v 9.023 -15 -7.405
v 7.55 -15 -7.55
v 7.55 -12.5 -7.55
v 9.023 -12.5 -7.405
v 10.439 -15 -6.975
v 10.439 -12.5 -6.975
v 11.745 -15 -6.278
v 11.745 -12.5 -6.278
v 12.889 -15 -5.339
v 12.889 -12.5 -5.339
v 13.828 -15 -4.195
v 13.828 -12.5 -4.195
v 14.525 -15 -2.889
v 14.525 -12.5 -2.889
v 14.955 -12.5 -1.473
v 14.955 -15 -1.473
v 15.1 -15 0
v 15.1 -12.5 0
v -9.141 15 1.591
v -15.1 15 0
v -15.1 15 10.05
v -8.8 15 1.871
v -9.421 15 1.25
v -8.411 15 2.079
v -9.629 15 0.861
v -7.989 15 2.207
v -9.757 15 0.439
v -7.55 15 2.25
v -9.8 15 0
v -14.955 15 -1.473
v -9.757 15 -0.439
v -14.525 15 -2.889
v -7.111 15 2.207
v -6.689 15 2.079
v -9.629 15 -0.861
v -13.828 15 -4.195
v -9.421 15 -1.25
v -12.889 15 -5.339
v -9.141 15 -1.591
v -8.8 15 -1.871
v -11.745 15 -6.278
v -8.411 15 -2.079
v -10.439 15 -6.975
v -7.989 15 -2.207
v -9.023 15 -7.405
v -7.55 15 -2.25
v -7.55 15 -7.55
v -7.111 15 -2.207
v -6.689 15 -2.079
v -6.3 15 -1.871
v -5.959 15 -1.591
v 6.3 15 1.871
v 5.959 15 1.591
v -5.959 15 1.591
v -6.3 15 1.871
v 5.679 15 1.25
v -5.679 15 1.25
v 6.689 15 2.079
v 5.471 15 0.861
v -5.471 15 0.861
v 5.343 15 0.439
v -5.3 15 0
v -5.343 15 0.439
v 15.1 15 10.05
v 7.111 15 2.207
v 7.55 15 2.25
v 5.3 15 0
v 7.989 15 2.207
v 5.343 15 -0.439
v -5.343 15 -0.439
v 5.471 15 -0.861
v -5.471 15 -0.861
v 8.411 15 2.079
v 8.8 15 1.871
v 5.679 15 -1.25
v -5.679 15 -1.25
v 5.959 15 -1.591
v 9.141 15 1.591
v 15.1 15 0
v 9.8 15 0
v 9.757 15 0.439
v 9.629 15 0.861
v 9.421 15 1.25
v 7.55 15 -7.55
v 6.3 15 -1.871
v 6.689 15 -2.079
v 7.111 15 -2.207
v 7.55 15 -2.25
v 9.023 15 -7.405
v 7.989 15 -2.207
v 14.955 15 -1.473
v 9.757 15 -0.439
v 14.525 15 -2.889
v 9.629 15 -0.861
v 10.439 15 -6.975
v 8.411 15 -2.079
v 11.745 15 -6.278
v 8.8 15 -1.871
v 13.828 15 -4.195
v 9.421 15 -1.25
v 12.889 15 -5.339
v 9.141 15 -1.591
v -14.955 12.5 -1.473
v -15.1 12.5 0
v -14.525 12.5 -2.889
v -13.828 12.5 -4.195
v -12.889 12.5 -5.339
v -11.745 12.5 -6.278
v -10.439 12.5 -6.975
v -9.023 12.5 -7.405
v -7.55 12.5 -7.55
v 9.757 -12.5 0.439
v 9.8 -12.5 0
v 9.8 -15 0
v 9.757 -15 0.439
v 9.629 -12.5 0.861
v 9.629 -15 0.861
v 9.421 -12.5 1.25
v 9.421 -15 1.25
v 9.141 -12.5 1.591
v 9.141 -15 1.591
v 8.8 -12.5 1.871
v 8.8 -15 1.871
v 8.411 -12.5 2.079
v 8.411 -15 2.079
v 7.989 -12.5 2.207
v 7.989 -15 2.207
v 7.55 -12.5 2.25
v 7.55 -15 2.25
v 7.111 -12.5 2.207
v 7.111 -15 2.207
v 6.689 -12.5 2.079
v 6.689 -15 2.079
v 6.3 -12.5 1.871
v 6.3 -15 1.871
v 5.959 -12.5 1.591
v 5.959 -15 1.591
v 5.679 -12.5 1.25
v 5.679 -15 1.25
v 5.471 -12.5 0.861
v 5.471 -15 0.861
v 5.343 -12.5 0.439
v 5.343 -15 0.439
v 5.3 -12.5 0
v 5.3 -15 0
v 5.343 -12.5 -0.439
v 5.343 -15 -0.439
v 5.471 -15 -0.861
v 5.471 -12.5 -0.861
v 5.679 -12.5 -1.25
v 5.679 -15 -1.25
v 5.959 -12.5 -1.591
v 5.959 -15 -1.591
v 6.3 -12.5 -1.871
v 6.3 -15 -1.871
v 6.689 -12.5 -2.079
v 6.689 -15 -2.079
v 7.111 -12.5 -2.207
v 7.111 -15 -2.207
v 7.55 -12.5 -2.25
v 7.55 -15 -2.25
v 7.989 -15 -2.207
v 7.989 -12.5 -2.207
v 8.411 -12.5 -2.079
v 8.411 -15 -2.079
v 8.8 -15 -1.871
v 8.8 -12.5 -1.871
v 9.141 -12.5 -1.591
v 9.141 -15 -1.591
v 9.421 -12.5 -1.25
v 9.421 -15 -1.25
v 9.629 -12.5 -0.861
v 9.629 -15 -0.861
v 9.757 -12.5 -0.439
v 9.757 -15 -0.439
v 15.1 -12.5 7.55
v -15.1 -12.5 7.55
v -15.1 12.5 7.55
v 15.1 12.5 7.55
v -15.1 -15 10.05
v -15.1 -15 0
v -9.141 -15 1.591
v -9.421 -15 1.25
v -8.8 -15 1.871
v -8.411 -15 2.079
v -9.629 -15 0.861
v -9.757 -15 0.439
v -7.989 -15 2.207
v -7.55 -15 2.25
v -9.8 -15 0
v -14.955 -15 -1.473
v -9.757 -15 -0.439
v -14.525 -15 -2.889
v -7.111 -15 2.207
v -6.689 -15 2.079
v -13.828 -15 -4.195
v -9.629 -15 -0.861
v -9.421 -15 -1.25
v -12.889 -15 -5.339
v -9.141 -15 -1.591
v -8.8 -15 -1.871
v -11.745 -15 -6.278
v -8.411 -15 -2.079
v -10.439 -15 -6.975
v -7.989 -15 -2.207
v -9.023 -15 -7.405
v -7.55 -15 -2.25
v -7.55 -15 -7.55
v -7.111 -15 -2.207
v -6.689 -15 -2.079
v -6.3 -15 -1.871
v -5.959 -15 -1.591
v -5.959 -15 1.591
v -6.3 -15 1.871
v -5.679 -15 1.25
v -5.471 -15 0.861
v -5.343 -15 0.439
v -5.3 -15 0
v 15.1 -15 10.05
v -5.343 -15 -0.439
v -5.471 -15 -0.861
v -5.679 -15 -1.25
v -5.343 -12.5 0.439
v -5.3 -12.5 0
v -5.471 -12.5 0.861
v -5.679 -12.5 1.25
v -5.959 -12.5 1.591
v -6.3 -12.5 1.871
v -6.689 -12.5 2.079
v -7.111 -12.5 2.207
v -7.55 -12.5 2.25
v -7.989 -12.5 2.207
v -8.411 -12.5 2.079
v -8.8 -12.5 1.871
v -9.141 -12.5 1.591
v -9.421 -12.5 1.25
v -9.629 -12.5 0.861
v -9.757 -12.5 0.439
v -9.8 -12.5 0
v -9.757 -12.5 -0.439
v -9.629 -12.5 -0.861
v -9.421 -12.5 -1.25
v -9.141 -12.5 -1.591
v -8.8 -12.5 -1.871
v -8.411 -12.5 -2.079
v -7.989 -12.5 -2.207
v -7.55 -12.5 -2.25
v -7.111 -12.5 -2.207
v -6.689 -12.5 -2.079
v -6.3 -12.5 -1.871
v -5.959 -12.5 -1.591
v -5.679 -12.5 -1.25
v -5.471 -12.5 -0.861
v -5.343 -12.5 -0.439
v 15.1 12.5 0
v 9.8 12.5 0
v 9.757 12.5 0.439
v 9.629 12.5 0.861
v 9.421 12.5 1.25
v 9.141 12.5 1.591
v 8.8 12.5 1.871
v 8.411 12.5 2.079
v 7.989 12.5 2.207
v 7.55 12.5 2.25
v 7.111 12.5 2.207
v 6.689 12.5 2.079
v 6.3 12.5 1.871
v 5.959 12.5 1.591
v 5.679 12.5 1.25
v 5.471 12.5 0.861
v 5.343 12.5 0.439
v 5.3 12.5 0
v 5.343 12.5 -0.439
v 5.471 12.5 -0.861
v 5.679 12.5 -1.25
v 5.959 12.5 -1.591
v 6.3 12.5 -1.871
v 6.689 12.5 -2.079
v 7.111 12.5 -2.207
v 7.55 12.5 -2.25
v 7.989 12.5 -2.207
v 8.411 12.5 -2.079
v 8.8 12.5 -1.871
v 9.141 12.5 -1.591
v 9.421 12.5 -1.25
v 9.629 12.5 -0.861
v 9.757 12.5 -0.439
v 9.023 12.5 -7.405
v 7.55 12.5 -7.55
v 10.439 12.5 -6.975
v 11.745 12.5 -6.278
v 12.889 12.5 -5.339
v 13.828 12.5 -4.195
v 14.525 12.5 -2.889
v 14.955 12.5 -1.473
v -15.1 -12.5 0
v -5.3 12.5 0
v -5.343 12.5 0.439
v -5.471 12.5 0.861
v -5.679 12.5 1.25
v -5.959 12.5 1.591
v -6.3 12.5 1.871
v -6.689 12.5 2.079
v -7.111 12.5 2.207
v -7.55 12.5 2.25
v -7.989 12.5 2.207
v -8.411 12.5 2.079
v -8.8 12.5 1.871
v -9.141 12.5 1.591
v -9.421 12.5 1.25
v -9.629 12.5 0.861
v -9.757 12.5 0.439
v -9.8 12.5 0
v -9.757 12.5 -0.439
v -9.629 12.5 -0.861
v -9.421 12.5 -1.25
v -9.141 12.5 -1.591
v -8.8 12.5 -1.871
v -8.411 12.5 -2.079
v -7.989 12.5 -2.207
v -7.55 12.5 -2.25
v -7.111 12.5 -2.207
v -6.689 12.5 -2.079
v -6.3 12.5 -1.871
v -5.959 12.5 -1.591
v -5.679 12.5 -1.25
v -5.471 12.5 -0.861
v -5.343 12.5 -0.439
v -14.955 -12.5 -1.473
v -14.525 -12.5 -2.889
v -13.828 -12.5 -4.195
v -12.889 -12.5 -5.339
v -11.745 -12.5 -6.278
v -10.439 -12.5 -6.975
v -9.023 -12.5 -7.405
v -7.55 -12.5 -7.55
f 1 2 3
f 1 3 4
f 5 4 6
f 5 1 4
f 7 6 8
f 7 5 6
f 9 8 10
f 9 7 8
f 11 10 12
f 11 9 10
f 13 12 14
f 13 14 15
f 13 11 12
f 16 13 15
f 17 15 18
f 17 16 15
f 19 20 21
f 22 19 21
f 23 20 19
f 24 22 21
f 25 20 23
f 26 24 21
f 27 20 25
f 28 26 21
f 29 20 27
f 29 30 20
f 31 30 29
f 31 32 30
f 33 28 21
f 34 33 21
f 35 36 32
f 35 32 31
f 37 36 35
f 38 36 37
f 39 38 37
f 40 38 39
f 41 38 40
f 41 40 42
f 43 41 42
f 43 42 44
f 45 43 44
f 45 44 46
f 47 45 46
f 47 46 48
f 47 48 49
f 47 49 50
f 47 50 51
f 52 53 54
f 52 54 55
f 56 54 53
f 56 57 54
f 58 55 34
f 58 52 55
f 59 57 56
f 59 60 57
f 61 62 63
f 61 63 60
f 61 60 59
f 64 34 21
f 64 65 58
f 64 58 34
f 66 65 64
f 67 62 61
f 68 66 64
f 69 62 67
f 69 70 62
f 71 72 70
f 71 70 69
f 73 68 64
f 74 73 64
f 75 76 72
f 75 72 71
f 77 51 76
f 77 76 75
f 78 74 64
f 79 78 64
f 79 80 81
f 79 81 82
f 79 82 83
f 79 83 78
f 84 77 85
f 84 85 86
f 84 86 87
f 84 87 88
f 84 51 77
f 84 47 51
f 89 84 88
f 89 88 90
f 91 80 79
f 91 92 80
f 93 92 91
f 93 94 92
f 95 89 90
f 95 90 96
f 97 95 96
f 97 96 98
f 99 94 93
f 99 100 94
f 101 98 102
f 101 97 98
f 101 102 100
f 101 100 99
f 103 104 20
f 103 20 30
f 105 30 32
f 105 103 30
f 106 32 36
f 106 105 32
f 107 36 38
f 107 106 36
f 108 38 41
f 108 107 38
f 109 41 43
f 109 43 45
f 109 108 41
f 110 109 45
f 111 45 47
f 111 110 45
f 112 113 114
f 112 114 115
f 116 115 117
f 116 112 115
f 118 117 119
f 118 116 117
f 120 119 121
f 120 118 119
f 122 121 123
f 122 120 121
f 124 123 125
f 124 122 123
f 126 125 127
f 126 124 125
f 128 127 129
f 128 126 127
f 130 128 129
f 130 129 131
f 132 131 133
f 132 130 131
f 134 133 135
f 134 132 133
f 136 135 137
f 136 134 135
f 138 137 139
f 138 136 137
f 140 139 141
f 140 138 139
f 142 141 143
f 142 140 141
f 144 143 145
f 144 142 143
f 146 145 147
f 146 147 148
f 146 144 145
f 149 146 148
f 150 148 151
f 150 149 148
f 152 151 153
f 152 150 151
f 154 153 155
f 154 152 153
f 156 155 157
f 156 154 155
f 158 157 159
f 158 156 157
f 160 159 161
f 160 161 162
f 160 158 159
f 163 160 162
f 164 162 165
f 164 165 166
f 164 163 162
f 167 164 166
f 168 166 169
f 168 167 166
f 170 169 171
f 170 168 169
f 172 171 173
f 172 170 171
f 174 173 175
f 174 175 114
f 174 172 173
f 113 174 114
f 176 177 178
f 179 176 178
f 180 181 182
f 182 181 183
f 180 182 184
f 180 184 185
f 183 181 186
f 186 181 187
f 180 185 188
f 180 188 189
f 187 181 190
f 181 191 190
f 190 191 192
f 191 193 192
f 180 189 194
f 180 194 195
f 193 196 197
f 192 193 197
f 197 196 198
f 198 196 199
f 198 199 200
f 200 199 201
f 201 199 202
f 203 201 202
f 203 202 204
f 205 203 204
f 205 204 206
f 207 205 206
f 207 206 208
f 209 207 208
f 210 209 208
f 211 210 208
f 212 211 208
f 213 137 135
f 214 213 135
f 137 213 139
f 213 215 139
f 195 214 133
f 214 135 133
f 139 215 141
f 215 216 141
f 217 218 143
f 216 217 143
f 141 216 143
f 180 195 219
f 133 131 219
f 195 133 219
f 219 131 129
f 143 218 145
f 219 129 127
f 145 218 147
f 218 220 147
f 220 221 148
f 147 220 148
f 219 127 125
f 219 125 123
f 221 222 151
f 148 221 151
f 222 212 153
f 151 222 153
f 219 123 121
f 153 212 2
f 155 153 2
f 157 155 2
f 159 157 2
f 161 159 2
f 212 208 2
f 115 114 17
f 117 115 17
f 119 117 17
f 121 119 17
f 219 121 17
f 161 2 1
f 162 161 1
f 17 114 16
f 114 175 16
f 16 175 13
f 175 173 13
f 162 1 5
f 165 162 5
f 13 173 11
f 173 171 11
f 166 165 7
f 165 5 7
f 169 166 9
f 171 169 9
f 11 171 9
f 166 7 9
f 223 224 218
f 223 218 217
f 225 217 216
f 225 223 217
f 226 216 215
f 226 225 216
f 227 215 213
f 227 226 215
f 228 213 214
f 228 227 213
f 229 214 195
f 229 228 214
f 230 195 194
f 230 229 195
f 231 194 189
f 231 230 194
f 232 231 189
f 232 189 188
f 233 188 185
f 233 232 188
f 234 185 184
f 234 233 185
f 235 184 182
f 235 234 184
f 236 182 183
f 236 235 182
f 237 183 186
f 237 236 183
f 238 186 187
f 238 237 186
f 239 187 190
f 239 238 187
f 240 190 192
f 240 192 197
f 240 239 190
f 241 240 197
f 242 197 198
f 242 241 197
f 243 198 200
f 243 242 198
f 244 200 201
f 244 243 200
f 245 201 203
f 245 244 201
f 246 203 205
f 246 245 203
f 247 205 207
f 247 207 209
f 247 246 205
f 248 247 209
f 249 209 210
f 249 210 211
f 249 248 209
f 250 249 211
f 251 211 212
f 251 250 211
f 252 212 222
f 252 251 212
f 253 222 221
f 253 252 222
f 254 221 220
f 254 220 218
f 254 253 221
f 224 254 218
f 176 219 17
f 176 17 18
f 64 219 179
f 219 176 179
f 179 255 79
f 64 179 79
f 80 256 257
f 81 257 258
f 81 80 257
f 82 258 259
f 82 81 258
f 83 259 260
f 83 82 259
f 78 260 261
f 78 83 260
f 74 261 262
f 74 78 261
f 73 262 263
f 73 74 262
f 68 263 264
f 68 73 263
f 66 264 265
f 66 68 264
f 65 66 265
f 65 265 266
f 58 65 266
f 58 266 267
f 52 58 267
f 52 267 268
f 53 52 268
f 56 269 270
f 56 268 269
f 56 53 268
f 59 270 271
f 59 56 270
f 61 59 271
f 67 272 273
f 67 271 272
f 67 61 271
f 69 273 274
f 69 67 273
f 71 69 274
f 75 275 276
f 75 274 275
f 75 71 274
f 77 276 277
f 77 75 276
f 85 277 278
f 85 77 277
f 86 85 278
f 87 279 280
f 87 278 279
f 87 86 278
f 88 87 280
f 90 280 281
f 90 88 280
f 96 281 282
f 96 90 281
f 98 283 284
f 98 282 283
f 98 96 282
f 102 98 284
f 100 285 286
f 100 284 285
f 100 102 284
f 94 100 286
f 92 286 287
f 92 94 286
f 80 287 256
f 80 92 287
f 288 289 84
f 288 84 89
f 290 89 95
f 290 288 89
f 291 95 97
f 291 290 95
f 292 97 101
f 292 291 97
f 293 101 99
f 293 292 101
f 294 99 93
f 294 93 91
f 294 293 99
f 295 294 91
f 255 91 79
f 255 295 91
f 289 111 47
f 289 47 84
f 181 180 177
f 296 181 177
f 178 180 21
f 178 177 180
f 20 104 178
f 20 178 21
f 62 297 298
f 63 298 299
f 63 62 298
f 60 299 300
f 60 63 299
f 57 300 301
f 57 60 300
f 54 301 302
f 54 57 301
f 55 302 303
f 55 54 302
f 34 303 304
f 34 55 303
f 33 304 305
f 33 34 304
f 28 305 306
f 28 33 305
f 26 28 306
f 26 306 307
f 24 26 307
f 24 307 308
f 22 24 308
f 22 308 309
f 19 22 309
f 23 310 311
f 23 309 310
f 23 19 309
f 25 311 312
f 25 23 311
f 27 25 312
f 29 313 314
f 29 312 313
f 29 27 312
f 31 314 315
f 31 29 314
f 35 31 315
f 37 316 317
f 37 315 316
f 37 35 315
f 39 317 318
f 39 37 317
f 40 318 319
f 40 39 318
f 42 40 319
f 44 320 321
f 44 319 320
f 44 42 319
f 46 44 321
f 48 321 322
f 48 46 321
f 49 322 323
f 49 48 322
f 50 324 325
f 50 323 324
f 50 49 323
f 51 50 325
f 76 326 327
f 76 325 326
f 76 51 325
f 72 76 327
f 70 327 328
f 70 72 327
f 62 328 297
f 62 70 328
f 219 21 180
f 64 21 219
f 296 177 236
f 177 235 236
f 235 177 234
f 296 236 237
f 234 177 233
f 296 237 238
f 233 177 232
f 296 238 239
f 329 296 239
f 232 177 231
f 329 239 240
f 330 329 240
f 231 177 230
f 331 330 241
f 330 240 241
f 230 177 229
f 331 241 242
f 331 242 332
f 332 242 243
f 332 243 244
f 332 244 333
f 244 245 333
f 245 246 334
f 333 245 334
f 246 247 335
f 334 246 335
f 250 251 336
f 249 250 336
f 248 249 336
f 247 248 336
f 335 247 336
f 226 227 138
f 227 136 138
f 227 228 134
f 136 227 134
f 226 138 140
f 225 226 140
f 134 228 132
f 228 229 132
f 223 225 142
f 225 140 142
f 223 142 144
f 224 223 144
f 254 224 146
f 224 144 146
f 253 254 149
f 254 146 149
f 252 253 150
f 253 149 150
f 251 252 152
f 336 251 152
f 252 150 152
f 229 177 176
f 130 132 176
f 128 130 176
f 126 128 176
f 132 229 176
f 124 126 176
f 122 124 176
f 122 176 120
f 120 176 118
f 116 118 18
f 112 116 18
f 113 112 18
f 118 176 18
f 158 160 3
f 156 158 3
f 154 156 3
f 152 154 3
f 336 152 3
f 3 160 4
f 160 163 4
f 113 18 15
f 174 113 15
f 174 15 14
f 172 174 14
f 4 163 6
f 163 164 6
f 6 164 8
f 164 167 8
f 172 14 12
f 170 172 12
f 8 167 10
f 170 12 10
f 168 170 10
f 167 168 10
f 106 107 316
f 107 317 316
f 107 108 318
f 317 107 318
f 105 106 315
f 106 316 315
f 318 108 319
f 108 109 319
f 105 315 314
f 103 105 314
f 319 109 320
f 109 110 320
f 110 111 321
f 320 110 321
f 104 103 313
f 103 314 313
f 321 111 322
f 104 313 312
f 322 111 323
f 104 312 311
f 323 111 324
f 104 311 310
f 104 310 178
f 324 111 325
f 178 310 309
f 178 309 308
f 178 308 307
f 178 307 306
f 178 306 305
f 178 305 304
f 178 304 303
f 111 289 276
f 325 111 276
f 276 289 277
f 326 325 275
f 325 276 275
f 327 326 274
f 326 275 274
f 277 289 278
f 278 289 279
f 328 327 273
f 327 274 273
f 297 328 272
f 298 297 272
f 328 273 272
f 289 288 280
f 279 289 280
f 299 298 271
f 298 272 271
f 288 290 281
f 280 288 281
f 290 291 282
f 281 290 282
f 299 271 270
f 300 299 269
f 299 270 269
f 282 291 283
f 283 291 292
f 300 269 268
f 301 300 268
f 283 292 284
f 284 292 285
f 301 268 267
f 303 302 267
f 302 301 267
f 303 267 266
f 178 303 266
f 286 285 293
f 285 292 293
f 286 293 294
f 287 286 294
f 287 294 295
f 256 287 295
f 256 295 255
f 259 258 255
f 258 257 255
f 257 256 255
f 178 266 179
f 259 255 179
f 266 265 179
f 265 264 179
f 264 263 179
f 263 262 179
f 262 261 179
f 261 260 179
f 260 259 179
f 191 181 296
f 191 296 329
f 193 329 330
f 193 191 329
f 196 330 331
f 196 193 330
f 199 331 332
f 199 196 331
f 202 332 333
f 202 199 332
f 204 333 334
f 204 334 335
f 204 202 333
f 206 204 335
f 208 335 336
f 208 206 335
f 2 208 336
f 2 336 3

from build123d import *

# Parameters (mm, degrees)
F0_R     = 2.25
F1_DEPTH = 15
F2_W     = 30.2
F2_H     = 30
F3_DEPTH = 2.5
F4_W     = 25
F4_H     = 7.55
F5_DEPTH = 30.201


with BuildPart() as f1:
    # F0 (on Front) → F1 (new body, symmetric)
    with BuildSketch(Plane.XZ):
        with BuildLine():
            ThreePointArc((-7.55, -7.55), (-2.211344, -5.338656), (0, 0))
            ThreePointArc((0, 0), (-2.211344, 5.338656), (-7.55, 7.55))
            ThreePointArc((-7.55, 7.55), (-12.888656, 5.338656), (-15.1, 0))
            ThreePointArc((-15.1, 0), (-12.888656, -5.338656), (-7.55, -7.55))
        make_face()
        with Locations((-7.55, 0)):
            Circle(F0_R, mode=Mode.SUBTRACT)
        with BuildLine():
            ThreePointArc((-15.1, 0), (-12.888656, 5.338656), (-7.55, 7.55))
            Line((-7.55, 7.55), (-15.1, 7.55))
            Line((-15.1, 7.55), (-15.1, 0))
        make_face()
        with BuildLine():
            ThreePointArc((-7.55, 7.55), (-2.211344, 5.338656), (0, 0))
            ThreePointArc((0, 0), (2.211344, 5.338656), (7.55, 7.55))
            Line((7.55, 7.55), (-7.55, 7.55))
        make_face()
        with BuildLine():
            Line((15.1, 7.55), (7.55, 7.55))
            ThreePointArc((7.55, 7.55), (12.888656, 5.338656), (15.1, 0))
            Line((15.1, 0), (15.1, 7.55))
        make_face()
        with BuildLine():
            ThreePointArc((7.55, -7.55), (2.211344, -5.338656), (0, 0))
            ThreePointArc((0, 0), (-2.211344, -5.338656), (-7.55, -7.55))
            Line((-7.55, -7.55), (7.55, -7.55))
        make_face()
        with BuildLine():
            ThreePointArc((7.55, 7.55), (2.211344, 5.338656), (0, 0))
            ThreePointArc((0, 0), (2.211344, -5.338656), (7.55, -7.55))
            ThreePointArc((7.55, -7.55), (12.888656, -5.338656), (15.1, 0))
            ThreePointArc((15.1, 0), (12.888656, 5.338656), (7.55, 7.55))
        make_face()
        with Locations((7.55, 0)):
            Circle(F0_R, mode=Mode.SUBTRACT)
    extrude(amount=F1_DEPTH, both=True)

    # F2 (on face) → F3 (join)
    with BuildSketch(Plane.XY.offset(7.55)):
        Rectangle(F2_W, F2_H)
    extrude(amount=F3_DEPTH)

    # F4 (on face) → F5 (cut, through all)
    with BuildSketch(Plane.YZ.offset(15.1)):
        with Locations((0, 3.775)):
            Rectangle(F4_W, F4_H)
        with Locations((0, -3.775)):
            Rectangle(F4_W, F4_H)
    extrude(amount=-F5_DEPTH, mode=Mode.SUBTRACT)


solid = f1.part
